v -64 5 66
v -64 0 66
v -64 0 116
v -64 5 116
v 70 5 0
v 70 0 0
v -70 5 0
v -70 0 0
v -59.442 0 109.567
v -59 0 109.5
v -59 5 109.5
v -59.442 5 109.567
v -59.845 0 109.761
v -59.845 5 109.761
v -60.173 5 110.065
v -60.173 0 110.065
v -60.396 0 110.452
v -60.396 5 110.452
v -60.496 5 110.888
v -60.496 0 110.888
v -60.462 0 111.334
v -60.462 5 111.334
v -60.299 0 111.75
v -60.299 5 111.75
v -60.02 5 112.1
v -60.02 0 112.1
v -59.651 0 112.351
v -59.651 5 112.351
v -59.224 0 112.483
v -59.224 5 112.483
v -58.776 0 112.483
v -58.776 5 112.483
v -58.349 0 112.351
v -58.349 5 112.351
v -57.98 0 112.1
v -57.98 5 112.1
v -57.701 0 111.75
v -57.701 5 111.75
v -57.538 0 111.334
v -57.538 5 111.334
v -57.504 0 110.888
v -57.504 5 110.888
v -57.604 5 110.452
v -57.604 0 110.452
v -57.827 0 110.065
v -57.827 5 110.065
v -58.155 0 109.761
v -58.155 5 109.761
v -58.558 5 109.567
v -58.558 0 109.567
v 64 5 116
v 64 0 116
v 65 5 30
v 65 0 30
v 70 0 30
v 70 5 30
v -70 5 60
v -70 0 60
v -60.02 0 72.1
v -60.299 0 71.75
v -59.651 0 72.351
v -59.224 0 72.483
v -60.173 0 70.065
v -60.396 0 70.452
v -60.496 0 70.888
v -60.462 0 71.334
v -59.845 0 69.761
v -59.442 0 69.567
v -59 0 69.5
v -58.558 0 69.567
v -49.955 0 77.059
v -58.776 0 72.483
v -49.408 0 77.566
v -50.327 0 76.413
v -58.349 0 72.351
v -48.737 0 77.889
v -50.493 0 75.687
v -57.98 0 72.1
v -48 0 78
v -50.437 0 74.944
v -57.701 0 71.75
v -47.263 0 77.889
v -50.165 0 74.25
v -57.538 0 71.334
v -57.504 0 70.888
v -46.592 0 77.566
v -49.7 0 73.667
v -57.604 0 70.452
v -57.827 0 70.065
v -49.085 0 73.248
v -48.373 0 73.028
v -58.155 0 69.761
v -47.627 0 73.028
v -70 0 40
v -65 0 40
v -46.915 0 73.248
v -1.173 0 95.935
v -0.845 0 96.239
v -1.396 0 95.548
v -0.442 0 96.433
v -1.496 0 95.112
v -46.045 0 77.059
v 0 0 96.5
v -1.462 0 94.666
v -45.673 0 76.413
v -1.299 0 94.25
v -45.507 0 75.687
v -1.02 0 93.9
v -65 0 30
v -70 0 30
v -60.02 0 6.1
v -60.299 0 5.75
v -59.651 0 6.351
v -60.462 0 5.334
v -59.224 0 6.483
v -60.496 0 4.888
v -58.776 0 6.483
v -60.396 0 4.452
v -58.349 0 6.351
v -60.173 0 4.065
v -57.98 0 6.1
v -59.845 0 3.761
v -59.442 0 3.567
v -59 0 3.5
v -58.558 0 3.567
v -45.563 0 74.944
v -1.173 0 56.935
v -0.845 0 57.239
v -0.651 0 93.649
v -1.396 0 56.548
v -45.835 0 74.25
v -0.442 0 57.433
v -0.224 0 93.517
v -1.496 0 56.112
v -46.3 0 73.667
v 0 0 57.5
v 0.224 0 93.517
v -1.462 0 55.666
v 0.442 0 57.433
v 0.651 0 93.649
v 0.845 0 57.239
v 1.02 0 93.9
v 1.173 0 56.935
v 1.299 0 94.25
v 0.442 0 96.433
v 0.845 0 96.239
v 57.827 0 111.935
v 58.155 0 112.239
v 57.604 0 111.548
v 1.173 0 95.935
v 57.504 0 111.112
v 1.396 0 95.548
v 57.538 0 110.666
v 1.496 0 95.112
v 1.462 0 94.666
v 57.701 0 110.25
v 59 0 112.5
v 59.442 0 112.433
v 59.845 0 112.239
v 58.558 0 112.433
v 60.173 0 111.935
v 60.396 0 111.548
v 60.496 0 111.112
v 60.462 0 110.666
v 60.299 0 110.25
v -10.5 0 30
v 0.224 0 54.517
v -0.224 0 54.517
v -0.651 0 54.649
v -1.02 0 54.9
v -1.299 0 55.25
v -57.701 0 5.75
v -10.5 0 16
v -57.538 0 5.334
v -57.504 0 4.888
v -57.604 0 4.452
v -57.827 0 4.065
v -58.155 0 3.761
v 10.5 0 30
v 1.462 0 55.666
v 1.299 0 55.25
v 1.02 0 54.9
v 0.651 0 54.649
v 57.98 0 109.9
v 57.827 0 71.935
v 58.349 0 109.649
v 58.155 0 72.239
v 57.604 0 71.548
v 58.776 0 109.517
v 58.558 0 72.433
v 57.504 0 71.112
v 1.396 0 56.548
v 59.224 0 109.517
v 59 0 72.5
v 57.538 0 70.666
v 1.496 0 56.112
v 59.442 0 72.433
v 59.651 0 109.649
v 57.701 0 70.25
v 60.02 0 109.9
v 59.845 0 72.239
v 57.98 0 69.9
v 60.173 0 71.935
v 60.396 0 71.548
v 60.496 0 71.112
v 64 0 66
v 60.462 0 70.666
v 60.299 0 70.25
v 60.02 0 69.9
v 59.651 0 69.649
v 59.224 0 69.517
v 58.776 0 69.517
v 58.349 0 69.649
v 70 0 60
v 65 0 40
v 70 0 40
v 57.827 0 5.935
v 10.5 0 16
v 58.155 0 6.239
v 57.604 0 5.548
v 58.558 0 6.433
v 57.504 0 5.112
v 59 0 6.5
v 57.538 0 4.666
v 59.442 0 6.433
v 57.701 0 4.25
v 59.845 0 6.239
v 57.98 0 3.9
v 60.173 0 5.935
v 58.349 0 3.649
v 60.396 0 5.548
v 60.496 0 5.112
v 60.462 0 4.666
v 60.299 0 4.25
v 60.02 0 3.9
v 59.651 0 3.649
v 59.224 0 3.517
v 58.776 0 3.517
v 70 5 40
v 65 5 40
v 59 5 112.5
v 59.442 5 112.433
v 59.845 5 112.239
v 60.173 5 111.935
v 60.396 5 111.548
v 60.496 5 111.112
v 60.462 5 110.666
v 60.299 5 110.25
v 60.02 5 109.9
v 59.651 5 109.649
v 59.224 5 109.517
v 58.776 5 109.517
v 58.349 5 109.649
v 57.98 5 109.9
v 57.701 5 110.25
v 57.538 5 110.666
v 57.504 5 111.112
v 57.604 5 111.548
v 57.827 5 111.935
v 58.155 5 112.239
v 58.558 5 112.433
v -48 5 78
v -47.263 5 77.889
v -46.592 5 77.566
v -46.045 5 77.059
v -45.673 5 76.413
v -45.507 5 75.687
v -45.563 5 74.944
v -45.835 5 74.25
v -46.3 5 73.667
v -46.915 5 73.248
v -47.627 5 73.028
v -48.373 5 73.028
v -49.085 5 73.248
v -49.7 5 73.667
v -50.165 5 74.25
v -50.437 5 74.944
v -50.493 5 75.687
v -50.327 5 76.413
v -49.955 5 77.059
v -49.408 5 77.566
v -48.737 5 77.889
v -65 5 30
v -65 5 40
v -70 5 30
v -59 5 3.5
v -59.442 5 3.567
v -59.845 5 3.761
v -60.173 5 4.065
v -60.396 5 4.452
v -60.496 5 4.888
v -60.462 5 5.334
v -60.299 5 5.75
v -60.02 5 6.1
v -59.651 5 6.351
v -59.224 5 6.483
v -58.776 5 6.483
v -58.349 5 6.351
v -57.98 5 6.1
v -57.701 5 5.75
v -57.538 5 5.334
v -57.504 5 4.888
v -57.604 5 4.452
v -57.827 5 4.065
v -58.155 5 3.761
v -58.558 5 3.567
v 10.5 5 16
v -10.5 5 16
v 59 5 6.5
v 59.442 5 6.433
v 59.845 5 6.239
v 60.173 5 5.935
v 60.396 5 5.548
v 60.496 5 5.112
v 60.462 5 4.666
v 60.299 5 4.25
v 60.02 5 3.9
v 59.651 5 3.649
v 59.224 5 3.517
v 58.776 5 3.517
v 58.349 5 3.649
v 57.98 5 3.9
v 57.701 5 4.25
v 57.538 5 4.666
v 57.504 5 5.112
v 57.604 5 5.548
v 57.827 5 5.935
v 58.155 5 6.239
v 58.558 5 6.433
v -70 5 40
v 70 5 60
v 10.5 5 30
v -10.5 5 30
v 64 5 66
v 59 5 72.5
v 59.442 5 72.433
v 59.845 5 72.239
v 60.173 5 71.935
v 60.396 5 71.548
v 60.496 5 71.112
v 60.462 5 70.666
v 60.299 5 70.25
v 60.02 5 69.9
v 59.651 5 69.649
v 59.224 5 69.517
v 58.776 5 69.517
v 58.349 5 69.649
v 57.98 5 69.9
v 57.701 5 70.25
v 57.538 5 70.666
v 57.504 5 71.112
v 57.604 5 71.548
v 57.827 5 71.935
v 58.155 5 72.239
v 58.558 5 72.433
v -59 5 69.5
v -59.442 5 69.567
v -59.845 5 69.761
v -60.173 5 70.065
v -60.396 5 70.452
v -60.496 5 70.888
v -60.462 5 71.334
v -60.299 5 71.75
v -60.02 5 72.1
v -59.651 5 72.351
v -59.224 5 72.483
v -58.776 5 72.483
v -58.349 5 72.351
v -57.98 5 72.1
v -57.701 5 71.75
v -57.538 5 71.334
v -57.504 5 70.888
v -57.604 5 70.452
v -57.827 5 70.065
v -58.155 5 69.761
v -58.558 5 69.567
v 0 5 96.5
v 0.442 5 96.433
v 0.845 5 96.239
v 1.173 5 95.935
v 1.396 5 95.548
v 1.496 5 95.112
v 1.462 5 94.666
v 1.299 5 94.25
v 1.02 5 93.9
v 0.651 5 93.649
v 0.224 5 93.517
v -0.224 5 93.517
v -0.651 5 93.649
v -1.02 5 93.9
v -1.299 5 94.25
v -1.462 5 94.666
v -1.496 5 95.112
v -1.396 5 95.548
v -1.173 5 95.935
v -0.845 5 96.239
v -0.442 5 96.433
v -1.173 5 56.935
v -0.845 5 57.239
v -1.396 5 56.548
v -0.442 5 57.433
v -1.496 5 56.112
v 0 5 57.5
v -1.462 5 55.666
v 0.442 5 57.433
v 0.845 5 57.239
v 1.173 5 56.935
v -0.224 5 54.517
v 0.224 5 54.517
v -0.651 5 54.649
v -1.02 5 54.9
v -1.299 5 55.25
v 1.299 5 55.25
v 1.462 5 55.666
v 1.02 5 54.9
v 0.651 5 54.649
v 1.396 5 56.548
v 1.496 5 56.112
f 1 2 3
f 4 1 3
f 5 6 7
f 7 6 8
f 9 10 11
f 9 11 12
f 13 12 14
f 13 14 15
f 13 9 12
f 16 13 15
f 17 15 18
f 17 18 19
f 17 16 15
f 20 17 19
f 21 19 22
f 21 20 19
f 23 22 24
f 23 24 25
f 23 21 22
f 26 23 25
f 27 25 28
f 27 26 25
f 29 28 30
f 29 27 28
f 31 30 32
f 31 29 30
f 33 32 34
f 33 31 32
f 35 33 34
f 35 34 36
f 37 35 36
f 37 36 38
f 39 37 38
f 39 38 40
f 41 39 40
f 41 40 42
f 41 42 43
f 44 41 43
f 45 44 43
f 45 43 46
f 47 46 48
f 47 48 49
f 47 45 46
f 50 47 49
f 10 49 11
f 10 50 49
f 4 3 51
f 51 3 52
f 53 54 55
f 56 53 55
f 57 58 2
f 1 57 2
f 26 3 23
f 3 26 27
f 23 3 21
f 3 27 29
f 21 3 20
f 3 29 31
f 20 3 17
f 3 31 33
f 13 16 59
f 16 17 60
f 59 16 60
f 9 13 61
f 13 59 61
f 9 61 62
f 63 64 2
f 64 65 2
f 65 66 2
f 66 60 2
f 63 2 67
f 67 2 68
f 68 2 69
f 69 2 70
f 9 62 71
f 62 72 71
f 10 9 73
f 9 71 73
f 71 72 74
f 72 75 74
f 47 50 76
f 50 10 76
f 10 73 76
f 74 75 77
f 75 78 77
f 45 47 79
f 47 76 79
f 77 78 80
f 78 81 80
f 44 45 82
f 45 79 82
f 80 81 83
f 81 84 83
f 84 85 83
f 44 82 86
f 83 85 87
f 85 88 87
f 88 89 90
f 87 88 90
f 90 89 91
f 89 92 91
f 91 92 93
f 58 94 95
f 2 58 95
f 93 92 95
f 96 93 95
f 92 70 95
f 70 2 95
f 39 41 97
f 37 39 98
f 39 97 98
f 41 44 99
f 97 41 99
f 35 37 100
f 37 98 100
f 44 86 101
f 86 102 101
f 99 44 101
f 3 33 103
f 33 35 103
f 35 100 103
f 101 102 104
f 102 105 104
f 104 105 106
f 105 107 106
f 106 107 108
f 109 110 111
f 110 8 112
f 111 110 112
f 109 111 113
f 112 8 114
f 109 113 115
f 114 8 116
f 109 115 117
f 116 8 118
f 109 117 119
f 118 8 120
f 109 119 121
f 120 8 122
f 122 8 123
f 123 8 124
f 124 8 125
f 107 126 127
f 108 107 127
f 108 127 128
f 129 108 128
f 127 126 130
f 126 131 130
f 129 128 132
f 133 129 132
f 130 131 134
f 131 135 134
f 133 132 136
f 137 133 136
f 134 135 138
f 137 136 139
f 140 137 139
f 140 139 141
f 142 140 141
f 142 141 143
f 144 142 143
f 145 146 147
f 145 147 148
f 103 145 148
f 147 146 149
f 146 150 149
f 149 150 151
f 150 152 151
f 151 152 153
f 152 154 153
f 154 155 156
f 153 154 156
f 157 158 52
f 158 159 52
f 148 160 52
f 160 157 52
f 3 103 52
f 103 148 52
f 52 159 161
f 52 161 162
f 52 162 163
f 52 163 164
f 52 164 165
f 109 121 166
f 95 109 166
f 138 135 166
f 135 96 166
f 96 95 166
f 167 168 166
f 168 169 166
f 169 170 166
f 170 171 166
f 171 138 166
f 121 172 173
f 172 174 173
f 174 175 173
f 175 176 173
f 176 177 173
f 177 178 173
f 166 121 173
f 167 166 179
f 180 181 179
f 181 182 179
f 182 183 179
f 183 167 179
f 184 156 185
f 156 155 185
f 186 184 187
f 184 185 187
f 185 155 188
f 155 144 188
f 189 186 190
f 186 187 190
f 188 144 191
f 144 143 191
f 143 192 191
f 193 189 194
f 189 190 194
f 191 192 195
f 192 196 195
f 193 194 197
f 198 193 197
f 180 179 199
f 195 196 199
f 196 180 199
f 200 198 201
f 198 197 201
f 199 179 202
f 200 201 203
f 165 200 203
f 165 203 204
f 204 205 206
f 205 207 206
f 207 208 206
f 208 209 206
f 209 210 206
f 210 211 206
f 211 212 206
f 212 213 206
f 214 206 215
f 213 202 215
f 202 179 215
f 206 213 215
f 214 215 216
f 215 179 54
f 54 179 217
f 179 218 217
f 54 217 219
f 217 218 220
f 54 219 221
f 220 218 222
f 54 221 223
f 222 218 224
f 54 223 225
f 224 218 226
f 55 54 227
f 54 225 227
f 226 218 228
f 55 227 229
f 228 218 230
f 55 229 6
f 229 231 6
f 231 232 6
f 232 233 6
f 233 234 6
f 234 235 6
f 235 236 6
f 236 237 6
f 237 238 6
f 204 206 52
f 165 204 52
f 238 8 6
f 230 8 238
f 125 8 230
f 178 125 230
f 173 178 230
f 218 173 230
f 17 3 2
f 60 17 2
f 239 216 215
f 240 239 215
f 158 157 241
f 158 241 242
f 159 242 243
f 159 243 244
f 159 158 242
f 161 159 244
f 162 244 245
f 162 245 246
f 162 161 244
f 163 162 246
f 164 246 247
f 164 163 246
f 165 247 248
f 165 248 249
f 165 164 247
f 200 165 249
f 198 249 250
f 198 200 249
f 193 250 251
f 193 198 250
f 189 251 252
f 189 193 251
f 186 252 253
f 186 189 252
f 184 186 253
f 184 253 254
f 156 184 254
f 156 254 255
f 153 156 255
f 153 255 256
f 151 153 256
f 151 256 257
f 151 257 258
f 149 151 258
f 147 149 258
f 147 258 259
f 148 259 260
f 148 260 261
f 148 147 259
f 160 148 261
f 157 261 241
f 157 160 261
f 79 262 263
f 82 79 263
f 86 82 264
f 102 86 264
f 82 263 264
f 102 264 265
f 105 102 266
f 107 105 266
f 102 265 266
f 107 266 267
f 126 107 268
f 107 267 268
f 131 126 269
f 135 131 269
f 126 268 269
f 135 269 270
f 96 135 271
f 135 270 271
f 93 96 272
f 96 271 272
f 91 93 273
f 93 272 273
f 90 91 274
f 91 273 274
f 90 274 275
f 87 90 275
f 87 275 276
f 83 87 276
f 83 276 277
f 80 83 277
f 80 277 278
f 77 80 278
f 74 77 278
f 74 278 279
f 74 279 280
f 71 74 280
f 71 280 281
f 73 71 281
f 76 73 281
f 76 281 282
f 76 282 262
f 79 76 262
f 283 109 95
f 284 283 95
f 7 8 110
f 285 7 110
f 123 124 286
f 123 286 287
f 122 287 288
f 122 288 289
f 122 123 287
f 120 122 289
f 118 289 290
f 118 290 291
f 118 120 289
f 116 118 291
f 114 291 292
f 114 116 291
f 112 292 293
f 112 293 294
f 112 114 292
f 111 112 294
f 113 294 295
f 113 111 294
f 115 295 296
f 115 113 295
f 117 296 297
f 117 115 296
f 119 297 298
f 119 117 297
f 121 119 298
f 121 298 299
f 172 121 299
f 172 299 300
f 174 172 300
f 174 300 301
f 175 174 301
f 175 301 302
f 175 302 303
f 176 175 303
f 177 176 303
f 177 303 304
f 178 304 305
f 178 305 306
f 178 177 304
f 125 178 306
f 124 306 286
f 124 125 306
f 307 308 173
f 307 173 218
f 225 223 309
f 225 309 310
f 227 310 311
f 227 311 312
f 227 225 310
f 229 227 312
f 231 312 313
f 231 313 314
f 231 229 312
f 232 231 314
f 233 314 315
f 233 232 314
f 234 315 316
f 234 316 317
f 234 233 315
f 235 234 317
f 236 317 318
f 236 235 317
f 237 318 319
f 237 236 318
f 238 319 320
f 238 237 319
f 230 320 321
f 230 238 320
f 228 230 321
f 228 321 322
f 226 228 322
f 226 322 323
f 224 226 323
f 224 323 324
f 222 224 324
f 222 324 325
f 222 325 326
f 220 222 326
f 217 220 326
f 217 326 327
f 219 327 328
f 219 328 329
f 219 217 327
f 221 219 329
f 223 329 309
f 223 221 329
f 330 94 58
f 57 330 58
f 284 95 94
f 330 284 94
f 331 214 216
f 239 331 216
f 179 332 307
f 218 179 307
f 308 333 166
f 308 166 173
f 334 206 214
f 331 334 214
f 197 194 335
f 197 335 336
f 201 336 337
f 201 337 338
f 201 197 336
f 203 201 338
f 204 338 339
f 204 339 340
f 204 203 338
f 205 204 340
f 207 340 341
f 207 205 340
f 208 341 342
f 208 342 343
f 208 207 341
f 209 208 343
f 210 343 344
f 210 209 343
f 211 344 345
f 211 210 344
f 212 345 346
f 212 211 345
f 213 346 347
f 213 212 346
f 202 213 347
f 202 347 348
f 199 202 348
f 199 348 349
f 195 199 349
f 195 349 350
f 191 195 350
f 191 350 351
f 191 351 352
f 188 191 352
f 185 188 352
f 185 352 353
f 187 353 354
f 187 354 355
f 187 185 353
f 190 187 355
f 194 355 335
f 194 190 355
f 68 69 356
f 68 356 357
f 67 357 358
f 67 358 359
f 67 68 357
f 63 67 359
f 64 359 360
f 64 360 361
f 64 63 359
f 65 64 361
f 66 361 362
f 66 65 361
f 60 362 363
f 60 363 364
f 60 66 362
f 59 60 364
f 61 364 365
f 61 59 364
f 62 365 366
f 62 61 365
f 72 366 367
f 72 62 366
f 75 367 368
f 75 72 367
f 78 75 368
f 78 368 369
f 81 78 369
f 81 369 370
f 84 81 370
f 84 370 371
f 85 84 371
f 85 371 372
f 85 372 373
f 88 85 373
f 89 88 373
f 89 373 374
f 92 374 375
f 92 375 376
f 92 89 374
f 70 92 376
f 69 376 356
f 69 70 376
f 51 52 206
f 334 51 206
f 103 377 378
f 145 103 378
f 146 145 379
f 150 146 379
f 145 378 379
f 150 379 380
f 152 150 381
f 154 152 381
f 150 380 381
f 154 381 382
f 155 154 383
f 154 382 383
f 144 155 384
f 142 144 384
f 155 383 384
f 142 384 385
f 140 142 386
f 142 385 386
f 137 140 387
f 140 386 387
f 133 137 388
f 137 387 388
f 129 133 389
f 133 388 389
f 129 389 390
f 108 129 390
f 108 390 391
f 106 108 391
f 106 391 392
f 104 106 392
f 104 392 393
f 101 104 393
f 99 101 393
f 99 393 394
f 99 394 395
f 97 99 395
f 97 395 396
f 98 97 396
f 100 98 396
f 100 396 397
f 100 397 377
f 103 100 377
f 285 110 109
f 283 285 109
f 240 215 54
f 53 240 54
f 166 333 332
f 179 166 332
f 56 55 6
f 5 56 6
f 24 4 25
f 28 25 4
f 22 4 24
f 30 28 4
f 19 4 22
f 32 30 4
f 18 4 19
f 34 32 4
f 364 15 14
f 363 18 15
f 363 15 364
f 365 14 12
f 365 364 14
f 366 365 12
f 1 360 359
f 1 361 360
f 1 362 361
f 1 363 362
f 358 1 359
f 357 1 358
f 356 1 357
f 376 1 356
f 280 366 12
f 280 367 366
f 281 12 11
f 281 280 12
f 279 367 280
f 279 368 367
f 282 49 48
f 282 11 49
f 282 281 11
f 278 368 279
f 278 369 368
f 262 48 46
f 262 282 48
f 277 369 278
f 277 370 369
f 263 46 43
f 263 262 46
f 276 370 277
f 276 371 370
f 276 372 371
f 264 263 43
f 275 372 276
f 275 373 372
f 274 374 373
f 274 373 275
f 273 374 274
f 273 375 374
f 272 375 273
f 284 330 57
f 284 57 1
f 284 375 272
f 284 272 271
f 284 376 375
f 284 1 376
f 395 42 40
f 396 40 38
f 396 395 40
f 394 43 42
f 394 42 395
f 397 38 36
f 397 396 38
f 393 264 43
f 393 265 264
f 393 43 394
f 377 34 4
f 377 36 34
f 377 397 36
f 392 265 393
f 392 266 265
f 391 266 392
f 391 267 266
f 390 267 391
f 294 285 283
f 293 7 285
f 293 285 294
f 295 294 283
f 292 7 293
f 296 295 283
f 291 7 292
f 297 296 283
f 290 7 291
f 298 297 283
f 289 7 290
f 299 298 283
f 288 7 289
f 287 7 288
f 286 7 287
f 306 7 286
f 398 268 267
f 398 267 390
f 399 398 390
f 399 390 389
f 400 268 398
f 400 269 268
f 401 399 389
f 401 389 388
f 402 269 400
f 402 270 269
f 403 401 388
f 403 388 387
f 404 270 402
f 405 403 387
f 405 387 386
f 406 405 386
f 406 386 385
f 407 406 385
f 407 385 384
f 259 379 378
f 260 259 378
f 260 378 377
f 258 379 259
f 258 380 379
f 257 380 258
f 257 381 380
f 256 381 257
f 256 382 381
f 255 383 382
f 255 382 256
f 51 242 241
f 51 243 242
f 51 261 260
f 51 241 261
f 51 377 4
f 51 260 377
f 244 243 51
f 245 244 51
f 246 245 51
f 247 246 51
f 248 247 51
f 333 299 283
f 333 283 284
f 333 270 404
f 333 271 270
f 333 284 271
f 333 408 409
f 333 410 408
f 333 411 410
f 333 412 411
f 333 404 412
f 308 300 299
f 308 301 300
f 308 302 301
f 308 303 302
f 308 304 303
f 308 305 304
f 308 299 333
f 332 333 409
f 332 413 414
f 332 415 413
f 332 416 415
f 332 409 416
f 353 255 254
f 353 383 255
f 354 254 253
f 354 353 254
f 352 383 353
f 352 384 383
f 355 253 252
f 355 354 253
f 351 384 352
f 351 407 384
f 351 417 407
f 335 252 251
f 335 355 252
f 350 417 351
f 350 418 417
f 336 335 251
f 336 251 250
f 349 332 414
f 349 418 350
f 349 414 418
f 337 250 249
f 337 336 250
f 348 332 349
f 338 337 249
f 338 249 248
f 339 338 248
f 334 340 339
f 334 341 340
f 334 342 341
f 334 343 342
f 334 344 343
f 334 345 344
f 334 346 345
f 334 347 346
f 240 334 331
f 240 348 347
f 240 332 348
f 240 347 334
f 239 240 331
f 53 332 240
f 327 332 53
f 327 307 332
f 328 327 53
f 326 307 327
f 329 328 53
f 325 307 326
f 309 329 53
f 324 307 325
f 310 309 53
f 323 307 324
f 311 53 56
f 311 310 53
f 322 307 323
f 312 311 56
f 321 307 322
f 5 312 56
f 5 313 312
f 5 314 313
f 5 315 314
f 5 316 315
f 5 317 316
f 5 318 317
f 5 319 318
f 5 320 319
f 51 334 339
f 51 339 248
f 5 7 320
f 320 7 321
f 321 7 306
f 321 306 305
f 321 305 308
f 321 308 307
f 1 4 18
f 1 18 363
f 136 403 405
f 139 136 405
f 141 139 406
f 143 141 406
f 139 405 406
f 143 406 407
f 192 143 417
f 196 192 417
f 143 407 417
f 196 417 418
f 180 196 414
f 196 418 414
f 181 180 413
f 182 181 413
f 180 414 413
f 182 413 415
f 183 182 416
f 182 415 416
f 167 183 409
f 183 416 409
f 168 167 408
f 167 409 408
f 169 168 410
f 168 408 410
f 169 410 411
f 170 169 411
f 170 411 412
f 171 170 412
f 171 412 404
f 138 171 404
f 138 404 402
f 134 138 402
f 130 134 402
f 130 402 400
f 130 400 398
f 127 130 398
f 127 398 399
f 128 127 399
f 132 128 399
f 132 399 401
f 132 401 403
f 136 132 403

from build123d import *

# Parameters (mm, degrees)
SKETCH1_R           = 1.5
BOSS_EXTRUDE1_DEPTH = 5
SKETCH2_R           = 1.5
SKETCH2_R_2         = 2.5
SKETCH2_W           = 21
SKETCH2_H           = 14
CUT_EXTRUDE1_DEPTH  = 136.576546644


with BuildPart() as part:
    # Sketch1 → Boss-Extrude1 (new body)
    with BuildSketch(Plane(origin=(0, 0, 0), x_dir=(1, 0, 0), z_dir=(0, 1, 0))):
        Polygon((64, -116), (64, -66), (70, -60), (70, -40), (65, -40), (65, -30), (70, -30), (70, 0), (-70, 0), (-70, -30), (-65, -30), (-65, -40), (-70, -40), (-70, -60), (-64, -66), (-64, -116), align=None)
        with Locations(Location((59, -5, 0), (0, 0, 270))):
            Circle(SKETCH1_R, mode=Mode.SUBTRACT)
        with Locations(Location((59, -71, 0), (0, 0, 270))):
            Circle(SKETCH1_R, mode=Mode.SUBTRACT)
        with Locations(Location((59, -111, 0), (0, 0, 270))):
            Circle(SKETCH1_R, mode=Mode.SUBTRACT)
        with Locations(Location((-59, -111, 0), (0, 0, 90))):
            Circle(SKETCH1_R, mode=Mode.SUBTRACT)
        with Locations(Location((-59, -71, 0), (0, 0, 90))):
            Circle(SKETCH1_R, mode=Mode.SUBTRACT)
        with Locations(Location((-59, -5, 0), (0, 0, 90))):
            Circle(SKETCH1_R, mode=Mode.SUBTRACT)
    extrude(amount=BOSS_EXTRUDE1_DEPTH)

    # Sketch2 → Cut-Extrude1 (cut, through all)
    with BuildSketch(Plane(origin=(0, 5, 0), x_dir=(1, 0, 0), z_dir=(0, 1, 0))):
        with Locations(Location((0, -56, 0), (0, 0, 270))):
            Circle(SKETCH2_R)
        with Locations(Location((0, -95, 0), (0, 0, 270))):
            Circle(SKETCH2_R)
        with Locations(Location((-48, -75.5, 0), (0, 0, 270))):
            Circle(SKETCH2_R_2)
        with Locations((0, -23)):
            Rectangle(SKETCH2_W, SKETCH2_H)
    extrude(amount=-CUT_EXTRUDE1_DEPTH, mode=Mode.SUBTRACT)


solid = part.part
